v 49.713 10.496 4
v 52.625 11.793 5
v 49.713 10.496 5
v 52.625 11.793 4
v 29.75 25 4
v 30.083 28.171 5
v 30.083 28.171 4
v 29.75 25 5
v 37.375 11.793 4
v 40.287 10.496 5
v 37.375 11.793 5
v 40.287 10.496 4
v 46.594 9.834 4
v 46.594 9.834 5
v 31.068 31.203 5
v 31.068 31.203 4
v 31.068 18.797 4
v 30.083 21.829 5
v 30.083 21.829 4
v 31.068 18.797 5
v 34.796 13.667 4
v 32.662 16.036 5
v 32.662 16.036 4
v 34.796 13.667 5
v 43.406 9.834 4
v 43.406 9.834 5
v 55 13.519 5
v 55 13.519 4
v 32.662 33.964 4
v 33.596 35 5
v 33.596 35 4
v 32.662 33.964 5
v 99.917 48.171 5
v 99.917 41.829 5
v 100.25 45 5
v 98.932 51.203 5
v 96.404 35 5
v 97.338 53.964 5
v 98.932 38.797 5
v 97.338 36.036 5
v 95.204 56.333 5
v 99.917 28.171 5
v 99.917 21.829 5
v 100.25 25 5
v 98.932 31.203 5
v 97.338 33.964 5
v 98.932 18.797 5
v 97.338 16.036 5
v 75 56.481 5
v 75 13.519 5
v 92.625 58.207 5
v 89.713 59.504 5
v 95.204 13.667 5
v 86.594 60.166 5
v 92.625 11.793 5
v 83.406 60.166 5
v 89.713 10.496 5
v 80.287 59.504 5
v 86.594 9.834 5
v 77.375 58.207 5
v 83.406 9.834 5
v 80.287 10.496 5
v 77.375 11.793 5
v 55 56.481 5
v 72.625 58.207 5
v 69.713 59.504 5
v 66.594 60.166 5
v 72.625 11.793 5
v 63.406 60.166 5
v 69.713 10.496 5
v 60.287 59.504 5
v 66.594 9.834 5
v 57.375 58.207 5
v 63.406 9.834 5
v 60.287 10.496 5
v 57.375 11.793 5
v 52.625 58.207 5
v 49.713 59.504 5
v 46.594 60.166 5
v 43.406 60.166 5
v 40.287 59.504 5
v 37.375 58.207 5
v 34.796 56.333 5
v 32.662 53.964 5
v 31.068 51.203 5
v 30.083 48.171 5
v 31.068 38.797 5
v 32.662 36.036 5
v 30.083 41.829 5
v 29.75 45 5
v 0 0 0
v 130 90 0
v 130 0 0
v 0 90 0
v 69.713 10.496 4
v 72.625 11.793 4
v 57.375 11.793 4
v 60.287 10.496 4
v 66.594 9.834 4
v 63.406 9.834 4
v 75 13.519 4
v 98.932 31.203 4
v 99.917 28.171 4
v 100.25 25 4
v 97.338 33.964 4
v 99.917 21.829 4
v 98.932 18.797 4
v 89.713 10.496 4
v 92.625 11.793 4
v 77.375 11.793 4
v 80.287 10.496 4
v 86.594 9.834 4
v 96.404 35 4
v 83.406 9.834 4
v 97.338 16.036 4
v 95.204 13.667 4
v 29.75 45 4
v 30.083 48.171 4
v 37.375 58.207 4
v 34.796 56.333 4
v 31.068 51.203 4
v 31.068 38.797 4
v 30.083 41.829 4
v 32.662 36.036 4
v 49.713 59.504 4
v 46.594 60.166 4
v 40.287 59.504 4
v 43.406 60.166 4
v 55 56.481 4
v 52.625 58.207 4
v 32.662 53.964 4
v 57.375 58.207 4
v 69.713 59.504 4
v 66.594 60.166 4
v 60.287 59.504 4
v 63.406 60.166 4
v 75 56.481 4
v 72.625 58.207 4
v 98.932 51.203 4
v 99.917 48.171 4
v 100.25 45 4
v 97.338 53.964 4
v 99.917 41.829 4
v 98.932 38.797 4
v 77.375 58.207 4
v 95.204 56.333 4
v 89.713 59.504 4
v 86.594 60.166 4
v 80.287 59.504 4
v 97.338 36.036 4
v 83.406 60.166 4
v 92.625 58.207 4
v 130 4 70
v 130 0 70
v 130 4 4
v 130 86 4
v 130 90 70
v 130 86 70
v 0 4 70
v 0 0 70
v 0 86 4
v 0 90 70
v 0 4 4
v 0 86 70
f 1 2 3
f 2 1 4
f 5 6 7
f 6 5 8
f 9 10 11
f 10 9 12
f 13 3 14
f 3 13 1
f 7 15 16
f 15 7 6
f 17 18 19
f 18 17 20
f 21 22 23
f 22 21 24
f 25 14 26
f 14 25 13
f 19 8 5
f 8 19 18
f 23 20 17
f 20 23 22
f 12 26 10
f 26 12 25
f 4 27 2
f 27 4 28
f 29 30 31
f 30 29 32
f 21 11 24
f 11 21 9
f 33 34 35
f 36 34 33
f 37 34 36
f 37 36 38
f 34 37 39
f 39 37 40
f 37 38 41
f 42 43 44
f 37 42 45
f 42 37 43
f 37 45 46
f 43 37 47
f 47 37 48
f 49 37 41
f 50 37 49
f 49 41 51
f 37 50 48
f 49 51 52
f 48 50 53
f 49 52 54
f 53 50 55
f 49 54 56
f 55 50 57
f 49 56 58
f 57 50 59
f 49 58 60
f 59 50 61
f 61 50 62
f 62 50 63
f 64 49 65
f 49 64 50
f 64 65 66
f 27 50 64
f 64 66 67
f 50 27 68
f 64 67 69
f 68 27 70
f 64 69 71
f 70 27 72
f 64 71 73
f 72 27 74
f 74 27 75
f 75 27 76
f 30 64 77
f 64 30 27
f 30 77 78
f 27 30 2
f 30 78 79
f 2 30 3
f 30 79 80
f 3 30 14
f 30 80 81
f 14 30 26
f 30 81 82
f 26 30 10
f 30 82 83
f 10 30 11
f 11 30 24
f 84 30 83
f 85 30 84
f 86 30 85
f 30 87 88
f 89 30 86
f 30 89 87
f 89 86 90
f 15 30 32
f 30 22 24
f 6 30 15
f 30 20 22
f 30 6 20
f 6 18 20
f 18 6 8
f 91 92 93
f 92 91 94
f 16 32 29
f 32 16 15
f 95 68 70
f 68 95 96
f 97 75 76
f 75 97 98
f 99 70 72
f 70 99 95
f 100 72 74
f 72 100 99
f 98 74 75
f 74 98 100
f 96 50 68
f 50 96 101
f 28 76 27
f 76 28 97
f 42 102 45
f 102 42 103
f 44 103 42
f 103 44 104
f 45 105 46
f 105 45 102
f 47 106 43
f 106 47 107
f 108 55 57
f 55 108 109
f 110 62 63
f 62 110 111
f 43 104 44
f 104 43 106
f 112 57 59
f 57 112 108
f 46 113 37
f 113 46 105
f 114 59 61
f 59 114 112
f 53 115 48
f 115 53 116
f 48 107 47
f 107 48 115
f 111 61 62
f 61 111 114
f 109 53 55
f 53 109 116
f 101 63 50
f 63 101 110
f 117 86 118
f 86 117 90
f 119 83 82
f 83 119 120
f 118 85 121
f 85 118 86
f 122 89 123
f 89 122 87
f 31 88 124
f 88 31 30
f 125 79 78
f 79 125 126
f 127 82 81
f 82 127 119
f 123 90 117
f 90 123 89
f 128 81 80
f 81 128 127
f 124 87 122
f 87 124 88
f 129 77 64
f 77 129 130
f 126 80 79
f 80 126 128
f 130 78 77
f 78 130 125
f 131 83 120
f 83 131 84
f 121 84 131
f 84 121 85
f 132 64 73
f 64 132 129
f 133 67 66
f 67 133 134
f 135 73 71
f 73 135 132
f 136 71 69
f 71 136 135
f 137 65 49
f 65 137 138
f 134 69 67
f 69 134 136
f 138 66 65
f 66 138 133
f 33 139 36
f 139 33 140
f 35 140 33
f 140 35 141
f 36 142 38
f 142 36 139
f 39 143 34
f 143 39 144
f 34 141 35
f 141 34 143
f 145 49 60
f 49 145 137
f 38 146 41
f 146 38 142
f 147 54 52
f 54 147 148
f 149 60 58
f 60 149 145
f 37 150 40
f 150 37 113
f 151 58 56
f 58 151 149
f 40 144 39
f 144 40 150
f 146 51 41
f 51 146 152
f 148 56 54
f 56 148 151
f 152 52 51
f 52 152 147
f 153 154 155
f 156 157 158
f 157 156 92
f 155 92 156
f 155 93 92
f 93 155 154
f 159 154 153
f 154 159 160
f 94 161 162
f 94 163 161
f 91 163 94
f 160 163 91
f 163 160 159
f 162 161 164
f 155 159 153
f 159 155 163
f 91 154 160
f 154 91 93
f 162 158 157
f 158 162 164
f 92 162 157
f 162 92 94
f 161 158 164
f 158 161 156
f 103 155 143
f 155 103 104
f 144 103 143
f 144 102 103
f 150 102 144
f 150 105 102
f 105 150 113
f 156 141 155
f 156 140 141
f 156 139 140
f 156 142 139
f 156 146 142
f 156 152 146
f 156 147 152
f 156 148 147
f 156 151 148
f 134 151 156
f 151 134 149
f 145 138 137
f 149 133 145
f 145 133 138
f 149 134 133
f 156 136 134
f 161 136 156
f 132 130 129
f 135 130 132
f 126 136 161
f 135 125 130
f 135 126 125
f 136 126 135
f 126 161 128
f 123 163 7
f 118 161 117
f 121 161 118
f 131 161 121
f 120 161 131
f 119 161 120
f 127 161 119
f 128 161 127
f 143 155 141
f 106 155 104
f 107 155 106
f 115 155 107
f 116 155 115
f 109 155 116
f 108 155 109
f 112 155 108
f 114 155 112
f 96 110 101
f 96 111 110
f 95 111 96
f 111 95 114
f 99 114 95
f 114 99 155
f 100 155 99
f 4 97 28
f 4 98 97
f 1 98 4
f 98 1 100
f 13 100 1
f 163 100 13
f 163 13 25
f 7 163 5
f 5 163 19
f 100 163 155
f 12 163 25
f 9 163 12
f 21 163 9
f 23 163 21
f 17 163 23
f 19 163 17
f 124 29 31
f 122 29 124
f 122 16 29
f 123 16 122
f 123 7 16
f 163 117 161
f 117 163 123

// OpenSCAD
// Dimensions for the Falcon tube rack design

// Plate dimensions
plate_x = 130; // Length of the plate (X-axis) in mm
plate_y = 90;  // Width of the plate (Y-axis) in mm
plate_thickness = 4; // Thickness of the base plate (Z-dimension at z=0)

// Hole dimensions
hole_diameter = 30.5; // Diameter of the through-holes in mm
hole_spacing = 40;    // Center-to-center spacing for holes in both X and Y directions in mm

// Wall dimensions
wall_length = plate_x; // Length of the side walls (X-dimension) in mm
wall_thickness = 4;   // Thickness of the side walls (Y-dimension)
wall_height = 70;     // Height of the side walls from z=0 to z=70

// Clearance for cutting operations (to ensure holes go through cleanly)
clearance = 1.0; // Increased clearance slightly to ensure cuts are distinct

// --- Base Plate ---
module base_plate() {
    cube([plate_x, plate_y, plate_thickness]);
}

// --- Through Holes ---
module through_holes() {
    // X positions: Centers should be at 20, 60, 100 (if spacing is 40 and plate is 130)
    // Plate center is 65. Hole centers relative to origin (0,0):
    // X centers: 65 - 20 = 45, 65, 65 + 20 = 85. Wait, the requirement is 3 holes along X, 40mm C-C spacing.
    // If plate_x=130, and we want 3 holes: (130 - 2*40) / 2 = 25. This suggests centers at 25, 65, 105.

    x_positions = [
        plate_x / 2 - hole_spacing / 2, // 130/2 - 20 = 25
        plate_x / 2,                     // 65
        plate_x / 2 + hole_spacing / 2  // 65 + 20 = 85
    ];

    // Y positions: We need 2 rows along Y. Plate_y=90. Spacing 40mm.
    // Centers should be at 90/2 - 20 = 20, and 90/2 = 45. (Only two rows fit nicely with 40 spacing)

    y_positions = [
        plate_y / 2 - hole_spacing / 2, // 20
        plate_y / 2                      // 45
    ];


    for (i = [0 : 1]) { // Iterate through the two rows along Y
        for (j = [0 : 2]) { // Iterate through the three columns along X
            // Calculate center coordinates for the hole
            hole_center_x = x_positions[j];
            hole_center_y = y_positions[i];

            translate([hole_center_x, hole_center_y, 0]) {
                cylinder(r = hole_diameter / 2, h = plate_thickness + clearance); // Hole goes through the plate thickness
            }
        }
    }
}

// --- Side Walls ---
module side_walls() {
    // Wall along the long edge at X=0 (or near it)
    // Extends from z=0 to z=70, thickness is wall_thickness (Y dimension)
    translate([0, 0, 0]) {
        cube([wall_length, wall_thickness, wall_height]);
    }

    // Wall along the long edge at X=plate_x (or near it)
    // Extends from z=0 to z=70, thickness is wall_thickness (Y dimension)
    translate([plate_x - wall_thickness, 0, 0]) {
        cube([wall_thickness, wall_thickness, wall_height]); // Only need the thickness in X direction for this part if we are building outwards from the plate.
                                                             // Wait, the description says: "Two solid walls run along the two long edges of the plate: each wall is 130 mm long (X) and 4 mm thick (Y), flush with the plate's long edge".

        // Reinterpreting: The wall runs along the X-axis (length=130). It has thickness 4mm in the Y direction.
        // Wall 1 is at Y=0, running from X=0 to X=130.
        // Wall 2 is at Y=90, running from X=0 to X=130.

        // Let's redefine based on this interpretation:
    }
}

module side_walls_corrected() {
    // Wall 1: Along the edge Y=0 (or near it)
    translate([0, 0, 0]) {
        cube([wall_length, wall_thickness, wall_height]);
    }

    // Wall 2: Along the edge Y=plate_y (90mm)
    translate([0, plate_y - wall_thickness, 0]) {
        cube([wall_length, wall_thickness, wall_height]);
    }
}


// --- Main Assembly ---
module falcon_rack() {
    // 1. Base Plate (at z=0 to z=plate_thickness)
    base_plate();

    // 2. Through Holes (cut through the plate)
    through_holes();

    // 3. Side Walls (rises from the plate to z=70)
    side_walls_corrected();
}

falcon_rack();
